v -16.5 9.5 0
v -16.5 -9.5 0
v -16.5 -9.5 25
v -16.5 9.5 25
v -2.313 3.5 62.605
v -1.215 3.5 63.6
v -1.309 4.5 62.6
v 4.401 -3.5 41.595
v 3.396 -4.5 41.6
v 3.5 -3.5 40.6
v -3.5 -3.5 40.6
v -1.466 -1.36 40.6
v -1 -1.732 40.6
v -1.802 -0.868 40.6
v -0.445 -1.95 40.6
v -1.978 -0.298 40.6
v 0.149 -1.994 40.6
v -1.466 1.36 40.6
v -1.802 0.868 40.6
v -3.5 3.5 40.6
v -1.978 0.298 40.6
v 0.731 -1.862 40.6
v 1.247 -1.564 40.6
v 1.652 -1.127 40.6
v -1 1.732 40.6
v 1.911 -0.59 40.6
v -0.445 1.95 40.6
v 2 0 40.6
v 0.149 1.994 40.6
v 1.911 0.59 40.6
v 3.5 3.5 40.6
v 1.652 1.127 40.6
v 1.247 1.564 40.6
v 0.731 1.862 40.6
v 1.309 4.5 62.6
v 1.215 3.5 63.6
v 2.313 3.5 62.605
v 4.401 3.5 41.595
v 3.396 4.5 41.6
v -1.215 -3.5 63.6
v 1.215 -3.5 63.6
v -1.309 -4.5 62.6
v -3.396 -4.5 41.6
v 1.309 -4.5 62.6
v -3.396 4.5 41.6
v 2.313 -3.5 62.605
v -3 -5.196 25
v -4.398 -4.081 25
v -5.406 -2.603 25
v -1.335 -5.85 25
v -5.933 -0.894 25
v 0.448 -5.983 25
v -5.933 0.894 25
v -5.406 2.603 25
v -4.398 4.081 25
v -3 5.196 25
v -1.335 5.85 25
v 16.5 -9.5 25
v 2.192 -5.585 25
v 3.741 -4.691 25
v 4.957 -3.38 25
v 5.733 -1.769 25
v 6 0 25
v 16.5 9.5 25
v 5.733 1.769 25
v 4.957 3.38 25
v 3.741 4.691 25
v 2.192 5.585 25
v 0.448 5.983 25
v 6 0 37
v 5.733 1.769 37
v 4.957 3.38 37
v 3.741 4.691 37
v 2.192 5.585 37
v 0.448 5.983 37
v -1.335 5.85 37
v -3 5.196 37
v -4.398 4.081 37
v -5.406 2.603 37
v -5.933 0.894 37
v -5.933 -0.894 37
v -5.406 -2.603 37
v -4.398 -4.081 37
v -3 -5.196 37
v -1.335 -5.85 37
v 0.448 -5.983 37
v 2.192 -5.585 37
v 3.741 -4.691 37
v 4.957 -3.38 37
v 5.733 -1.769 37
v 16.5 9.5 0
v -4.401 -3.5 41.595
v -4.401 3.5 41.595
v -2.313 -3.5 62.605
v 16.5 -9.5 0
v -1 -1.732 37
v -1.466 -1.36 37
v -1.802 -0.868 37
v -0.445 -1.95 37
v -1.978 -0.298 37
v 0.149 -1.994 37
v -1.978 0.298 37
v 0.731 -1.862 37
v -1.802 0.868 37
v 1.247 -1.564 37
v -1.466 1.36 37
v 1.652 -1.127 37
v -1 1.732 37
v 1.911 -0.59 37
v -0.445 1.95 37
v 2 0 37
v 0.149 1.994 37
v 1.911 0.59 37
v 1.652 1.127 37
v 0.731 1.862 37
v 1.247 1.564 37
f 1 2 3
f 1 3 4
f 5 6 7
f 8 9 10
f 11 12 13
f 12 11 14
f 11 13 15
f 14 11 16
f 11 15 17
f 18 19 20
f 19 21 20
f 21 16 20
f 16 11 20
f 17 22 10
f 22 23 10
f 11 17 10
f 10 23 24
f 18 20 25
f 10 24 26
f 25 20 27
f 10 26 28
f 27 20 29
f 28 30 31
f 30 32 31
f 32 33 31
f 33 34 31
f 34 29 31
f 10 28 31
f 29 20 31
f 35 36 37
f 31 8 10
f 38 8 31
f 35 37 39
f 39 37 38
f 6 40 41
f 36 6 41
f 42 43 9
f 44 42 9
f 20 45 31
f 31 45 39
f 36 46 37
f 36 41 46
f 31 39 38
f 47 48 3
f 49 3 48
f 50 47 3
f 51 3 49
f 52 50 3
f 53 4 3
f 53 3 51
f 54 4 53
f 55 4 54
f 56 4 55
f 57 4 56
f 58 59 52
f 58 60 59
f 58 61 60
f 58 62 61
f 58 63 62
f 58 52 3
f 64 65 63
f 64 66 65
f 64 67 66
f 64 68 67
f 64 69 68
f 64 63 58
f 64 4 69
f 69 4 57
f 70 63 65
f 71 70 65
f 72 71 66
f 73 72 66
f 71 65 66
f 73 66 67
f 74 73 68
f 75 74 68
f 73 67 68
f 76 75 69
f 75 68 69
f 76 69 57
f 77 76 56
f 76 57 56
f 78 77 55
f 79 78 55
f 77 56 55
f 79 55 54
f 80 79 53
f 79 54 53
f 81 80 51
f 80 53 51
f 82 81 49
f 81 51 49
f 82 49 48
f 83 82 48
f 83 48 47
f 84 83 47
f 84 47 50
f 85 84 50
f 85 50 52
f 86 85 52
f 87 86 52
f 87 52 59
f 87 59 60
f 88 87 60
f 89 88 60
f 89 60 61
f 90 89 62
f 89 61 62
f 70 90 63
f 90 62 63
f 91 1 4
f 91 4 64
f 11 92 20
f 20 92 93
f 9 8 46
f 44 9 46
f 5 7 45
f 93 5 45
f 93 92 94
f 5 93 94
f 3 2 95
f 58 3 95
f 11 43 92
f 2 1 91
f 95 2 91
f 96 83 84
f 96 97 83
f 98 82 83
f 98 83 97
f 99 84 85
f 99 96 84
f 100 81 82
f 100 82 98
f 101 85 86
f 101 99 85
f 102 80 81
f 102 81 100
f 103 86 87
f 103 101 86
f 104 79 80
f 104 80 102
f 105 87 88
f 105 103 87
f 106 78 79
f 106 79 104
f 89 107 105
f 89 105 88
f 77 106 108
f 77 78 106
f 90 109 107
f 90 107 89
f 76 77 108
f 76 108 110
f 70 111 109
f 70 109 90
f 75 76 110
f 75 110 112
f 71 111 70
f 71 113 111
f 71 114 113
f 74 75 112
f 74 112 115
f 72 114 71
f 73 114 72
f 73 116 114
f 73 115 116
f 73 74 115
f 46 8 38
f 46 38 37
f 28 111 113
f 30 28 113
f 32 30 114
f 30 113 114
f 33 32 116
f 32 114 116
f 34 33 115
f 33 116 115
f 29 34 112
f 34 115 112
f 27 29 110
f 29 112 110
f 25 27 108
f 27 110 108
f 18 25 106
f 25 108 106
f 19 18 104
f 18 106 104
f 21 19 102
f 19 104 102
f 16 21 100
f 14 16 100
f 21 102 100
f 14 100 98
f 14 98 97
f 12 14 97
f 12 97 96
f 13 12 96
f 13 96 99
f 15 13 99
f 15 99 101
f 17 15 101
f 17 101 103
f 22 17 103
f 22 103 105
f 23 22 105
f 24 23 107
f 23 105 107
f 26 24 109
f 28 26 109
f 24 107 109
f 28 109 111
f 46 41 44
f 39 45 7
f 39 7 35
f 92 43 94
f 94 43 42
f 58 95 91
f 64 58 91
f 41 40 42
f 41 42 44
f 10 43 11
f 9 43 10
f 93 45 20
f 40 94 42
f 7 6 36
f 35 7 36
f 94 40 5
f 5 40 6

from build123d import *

# Parameters (mm, degrees)
SKETCH_W     = 33
SKETCH_H     = 19
PAD_DEPTH    = 25
SKETCH001_R  = 6
PAD001_DEPTH = 12
SKETCH002_R  = 2
PAD002_DEPTH = 3.6
SKETCH003_W  = 9
SKETCH003_H  = 9
PAD003_DEPTH = 23
POCKET_DEPTH = 13
CHAMFER_SIZE = 1


with BuildPart() as part:
    # Sketch → Pad (new body)
    with BuildSketch(Plane.XY):
        Rectangle(SKETCH_W, SKETCH_H)
    extrude(amount=PAD_DEPTH)

    # Sketch001 (on Face6 of Pad) → Pad001 (join)
    with BuildSketch(Plane.XY.offset(25)):
        Circle(SKETCH001_R)
    extrude(amount=PAD001_DEPTH)

    # Sketch002 (on Face8 of Pad001) → Pad002 (join)
    with BuildSketch(Plane.XY.offset(37)):
        Circle(SKETCH002_R)
    extrude(amount=PAD002_DEPTH)

    # Sketch003 (on Face10 of Pad002) → Pad003 (join)
    with BuildSketch(Plane.XY.offset(40.6)):
        Rectangle(SKETCH003_W, SKETCH003_H)
    extrude(amount=PAD003_DEPTH)

    # Sketch004 (on Face2 of Pad003) → Pocket (cut)
    with BuildSketch(Plane.XZ.offset(4.5)):
        Polygon((-4.5, 40.6), (-2.214518, 63.6), (-4.5, 63.6), align=None)
    pocket = extrude(amount=-POCKET_DEPTH, mode=Mode.SUBTRACT)

    # Mirrored: Pocket across Sketch004 V_Axis
    add(pocket.mirror(Plane(origin=(0, -4.5, 0), x_dir=(0, -1, 0), z_dir=(1, 0, 0))), mode=Mode.SUBTRACT)

    # Chamfer
    chamfer_edges = [part.edges().sort_by_distance(p)[0] for p in [
        (-3.357259, -4.5, 52.1),
        (0, -4.5, 40.6),
        (3.357259, -4.5, 52.1),
        (-4.5, 0, 40.6),
        (-3.357259, 4.5, 52.1),
        (3.357259, 4.5, 52.1),
        (0, 4.5, 40.6),
        (2.214518, 0, 63.6),
        (0, -4.5, 63.6),
        (-2.214518, 0, 63.6),
        (0, 4.5, 63.6),
        (4.5, 0, 40.6),
    ]]
    chamfer(chamfer_edges, length=CHAMFER_SIZE)


solid = part.part
